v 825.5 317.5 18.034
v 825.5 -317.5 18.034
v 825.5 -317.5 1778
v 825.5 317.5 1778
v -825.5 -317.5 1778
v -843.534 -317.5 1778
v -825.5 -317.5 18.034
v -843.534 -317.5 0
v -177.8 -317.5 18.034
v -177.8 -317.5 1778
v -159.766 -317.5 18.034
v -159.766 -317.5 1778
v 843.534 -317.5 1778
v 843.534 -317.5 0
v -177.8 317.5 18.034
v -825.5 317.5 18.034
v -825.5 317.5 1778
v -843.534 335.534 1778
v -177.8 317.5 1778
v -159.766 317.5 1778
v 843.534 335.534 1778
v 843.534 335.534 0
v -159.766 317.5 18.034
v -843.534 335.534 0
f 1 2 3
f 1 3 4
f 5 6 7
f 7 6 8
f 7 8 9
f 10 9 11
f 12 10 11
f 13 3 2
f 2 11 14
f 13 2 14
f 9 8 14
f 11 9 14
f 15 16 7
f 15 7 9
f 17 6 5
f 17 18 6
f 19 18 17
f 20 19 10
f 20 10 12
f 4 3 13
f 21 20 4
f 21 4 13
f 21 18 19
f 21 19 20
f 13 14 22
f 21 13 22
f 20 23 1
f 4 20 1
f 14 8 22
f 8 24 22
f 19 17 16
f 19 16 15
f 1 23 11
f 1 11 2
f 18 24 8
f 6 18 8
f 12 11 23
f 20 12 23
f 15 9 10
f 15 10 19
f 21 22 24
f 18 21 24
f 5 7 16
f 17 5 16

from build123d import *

# Parameters (mm, degrees)
F0_W     = 647.7
F0_H     = 635
F1_DEPTH = 18.034
F0_W_2   = 985.266
F0_W_3   = 18.034
F2_DEPTH = 1778


with BuildPart() as f1:
    # F0 (on Top) → F1 (new body)
    with BuildSketch(Plane.XY):
        with Locations((-501.65, 0)):
            Rectangle(F0_W, F0_H)
    extrude(amount=F1_DEPTH)



with BuildPart() as f1b:
    # F0 (on Top) → F1, piece 2 (new body)
    with BuildSketch(Plane.XY):
        with Locations((332.867, 0)):
            Rectangle(F0_W_2, F0_H)
    extrude(amount=F1_DEPTH)


with BuildPart() as f1_1:
    add(f1.part)

    add(f1b.part)  # F2 merges F1b
    # F0 (on Top) → F2 (join)
    with BuildSketch(Plane.XY):
        with Locations((-834.517, 0)):
            Rectangle(F0_W_3, F0_H)
        with Locations((834.517, 0)):
            Rectangle(F0_W_3, F0_H)
        Polygon((-843.534, 317.5), (-825.5, 317.5), (-177.8, 317.5), (-159.766, 317.5), (825.5, 317.5), (843.534, 317.5), (843.534, 335.534), (-843.534, 335.534), align=None)
        with Locations((-168.783, 0)):
            Rectangle(F0_W_3, F0_H)
    extrude(amount=F2_DEPTH)


solid = f1_1.part
